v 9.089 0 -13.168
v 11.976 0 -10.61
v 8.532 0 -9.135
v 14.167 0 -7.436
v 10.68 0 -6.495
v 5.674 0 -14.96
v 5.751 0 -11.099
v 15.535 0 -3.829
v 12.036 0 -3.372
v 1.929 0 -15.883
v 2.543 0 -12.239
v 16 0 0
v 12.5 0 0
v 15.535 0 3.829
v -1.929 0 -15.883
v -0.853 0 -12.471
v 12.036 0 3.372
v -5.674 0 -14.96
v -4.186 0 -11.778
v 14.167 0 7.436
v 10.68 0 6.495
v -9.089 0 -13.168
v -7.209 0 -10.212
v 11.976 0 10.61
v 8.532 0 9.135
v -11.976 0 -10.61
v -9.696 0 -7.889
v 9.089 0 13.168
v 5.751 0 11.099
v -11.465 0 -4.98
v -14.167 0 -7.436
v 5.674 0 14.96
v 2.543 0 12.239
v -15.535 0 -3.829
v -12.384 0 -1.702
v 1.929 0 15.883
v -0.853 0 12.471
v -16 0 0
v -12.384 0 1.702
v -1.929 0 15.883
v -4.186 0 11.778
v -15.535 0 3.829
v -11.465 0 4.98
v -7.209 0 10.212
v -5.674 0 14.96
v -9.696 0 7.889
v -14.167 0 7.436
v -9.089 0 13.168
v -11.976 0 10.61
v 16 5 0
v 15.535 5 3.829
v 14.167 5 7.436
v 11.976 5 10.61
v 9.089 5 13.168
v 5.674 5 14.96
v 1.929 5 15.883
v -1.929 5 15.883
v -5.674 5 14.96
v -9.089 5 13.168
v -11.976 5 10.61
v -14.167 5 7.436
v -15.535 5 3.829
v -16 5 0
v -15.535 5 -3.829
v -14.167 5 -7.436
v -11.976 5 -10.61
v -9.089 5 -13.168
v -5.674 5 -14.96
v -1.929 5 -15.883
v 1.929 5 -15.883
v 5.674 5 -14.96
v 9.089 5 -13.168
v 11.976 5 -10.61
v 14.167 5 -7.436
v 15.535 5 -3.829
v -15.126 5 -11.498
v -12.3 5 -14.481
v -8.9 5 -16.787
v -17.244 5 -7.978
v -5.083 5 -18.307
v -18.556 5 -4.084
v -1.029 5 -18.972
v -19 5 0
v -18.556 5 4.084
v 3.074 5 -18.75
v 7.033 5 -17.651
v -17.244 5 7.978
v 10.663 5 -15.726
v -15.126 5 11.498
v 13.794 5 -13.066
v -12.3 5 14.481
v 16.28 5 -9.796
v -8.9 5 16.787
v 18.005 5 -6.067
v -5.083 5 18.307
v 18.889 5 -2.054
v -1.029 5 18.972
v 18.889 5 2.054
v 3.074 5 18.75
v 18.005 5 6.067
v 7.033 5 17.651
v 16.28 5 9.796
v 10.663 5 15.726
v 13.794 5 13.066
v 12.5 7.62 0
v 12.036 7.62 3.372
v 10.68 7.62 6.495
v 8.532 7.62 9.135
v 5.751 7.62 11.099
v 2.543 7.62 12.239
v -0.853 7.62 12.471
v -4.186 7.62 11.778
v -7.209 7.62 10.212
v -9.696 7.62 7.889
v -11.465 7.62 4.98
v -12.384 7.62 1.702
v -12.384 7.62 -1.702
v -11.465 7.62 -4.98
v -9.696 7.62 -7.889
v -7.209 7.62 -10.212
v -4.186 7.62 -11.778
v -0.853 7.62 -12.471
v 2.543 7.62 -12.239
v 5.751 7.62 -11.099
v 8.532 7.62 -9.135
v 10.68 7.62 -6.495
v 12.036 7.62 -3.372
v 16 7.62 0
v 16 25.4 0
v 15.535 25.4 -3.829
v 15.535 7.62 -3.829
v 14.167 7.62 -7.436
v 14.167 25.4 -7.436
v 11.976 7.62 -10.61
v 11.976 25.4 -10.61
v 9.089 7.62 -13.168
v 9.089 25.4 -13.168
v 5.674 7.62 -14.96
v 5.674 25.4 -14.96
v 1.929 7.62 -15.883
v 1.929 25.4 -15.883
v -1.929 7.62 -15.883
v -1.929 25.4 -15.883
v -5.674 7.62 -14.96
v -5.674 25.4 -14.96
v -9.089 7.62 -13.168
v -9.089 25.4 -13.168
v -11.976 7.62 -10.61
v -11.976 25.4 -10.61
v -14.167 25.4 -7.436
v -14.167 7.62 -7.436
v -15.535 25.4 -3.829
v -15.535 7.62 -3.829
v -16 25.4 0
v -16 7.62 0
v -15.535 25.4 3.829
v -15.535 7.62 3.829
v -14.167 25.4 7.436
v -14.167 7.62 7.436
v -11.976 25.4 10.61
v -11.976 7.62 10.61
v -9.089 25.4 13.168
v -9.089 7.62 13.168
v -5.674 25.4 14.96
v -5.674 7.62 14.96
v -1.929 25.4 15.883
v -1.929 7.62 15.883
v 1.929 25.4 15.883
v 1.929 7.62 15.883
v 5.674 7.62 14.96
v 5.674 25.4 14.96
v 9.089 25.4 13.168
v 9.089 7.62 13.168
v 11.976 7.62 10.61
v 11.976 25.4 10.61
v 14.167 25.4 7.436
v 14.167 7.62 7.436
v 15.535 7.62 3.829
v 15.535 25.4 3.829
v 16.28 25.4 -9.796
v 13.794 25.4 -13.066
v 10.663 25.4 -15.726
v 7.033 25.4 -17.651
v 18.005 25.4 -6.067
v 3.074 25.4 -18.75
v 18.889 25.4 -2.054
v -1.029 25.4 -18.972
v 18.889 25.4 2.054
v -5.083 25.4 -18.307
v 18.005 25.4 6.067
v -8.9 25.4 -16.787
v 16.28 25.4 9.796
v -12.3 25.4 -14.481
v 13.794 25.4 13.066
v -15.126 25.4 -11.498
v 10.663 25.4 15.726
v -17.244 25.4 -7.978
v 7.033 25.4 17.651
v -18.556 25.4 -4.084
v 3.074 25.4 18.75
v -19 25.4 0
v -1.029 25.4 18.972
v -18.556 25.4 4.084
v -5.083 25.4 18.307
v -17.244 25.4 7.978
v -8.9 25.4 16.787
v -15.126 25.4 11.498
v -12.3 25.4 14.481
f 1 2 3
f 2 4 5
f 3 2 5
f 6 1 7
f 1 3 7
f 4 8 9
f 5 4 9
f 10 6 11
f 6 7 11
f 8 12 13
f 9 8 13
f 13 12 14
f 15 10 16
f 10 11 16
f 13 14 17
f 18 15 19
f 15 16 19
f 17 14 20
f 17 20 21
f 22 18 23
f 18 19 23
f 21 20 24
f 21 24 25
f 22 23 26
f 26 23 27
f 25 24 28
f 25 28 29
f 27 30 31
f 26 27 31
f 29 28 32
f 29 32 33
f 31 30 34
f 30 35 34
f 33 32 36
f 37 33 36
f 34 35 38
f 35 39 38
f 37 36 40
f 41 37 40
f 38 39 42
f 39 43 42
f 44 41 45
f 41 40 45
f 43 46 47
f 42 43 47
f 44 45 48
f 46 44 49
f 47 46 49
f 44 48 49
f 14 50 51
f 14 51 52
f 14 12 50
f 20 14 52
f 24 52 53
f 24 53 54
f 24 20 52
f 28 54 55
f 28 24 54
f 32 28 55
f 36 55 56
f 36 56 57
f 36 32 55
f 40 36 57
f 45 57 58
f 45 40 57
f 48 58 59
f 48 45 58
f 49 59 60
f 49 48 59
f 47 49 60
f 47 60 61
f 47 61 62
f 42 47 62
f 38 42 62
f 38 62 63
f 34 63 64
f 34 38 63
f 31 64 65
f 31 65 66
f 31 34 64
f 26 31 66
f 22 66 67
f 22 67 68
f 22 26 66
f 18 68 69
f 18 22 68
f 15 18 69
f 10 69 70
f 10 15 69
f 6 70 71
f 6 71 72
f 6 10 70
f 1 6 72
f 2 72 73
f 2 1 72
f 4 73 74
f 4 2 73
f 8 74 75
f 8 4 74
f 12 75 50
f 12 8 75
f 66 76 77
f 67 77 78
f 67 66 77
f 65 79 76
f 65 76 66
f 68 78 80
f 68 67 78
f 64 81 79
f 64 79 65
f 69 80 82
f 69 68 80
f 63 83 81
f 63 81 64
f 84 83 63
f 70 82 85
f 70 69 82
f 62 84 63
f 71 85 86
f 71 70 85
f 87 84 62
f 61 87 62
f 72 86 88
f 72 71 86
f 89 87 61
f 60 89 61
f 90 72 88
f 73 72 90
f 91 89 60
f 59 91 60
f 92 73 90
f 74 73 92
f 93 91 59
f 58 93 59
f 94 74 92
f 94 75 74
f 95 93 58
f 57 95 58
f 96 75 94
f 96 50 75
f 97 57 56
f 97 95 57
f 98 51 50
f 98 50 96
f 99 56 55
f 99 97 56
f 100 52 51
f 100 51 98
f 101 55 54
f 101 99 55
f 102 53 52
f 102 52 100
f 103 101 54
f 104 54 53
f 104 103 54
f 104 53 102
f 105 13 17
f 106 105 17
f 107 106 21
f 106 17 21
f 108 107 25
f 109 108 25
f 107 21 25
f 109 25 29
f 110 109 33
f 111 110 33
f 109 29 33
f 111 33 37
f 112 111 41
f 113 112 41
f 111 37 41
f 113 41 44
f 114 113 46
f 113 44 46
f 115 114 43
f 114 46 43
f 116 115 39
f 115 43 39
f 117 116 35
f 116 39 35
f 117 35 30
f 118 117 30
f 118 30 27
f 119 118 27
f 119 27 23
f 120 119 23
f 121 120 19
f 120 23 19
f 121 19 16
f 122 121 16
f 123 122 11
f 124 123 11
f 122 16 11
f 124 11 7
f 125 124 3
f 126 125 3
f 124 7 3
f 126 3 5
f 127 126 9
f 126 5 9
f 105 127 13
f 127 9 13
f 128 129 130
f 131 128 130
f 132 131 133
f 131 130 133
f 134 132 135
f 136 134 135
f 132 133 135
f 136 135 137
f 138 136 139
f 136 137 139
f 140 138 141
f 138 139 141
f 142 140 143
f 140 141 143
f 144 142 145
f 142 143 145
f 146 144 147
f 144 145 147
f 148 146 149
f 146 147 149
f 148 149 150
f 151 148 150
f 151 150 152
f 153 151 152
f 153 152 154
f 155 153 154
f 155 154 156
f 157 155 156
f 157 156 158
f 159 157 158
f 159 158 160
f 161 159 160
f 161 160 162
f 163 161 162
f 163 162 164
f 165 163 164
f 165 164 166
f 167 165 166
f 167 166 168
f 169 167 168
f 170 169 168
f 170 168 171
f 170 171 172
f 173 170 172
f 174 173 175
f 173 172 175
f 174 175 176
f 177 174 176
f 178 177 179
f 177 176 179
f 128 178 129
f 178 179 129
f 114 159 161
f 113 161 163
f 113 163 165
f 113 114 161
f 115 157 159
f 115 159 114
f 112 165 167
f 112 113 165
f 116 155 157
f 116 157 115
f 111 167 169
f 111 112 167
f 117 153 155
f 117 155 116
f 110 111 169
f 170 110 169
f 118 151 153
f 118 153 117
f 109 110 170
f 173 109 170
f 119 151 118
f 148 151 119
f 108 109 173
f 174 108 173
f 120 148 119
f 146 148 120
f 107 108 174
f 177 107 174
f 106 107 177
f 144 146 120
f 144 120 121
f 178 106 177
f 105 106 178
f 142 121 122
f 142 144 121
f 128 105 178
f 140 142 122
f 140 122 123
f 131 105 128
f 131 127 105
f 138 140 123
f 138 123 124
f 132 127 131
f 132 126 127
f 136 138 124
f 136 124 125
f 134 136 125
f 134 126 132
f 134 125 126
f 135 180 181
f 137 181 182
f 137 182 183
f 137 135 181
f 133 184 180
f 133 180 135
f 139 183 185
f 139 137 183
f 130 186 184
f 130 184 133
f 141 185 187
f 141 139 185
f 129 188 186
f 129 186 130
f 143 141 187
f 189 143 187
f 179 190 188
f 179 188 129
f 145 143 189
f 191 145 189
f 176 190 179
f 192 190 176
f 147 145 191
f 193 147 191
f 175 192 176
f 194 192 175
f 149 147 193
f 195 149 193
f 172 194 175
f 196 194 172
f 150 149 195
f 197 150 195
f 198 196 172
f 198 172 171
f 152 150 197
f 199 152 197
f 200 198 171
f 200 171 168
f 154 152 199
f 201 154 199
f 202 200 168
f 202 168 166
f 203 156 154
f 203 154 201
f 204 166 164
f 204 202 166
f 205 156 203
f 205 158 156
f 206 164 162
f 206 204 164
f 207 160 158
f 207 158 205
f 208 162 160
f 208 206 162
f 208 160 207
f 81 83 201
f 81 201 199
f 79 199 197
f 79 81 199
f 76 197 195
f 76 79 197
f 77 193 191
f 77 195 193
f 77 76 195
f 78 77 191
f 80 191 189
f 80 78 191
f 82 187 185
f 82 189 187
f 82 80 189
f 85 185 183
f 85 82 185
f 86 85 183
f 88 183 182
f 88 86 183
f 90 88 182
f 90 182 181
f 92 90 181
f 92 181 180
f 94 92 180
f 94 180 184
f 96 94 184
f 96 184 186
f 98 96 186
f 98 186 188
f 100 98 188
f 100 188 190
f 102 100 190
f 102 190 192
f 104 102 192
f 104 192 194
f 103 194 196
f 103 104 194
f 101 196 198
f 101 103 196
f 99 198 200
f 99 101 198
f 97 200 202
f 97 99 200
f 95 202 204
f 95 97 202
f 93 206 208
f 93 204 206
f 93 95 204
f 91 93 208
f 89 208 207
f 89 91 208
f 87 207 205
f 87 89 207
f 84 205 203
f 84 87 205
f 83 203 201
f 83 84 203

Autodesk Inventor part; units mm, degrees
ref_plane "YZ Plane" through (0, 0, 0) normal (1, 0, 0) x (0, 1, 0)
ref_plane "XZ Plane" through (0, 0, 0) normal (0, 1, 0) x (-1, 0, 0)
ref_plane "XY Plane" through (0, 0, 0) normal (0, 0, 1) x (1, 0, 0)
sketch "Sketch1" plane through (0, 0, 0) normal (0, 1, 0) x (-1, 0, 0)
  circle A0 centre (0, 0) radius 19
  dimension "d0" = 38
extrude "Extrusion1" add sketch "Sketch1" along normal blind 25.4
sketch "Sketch3" plane through (0, 0, 0) normal (0, -1, 0) x (1, 0, 0)
  circle A0 centre (0, 0) radius 19 projected
  circle A1 centre (0, 0) radius 16
  dimension "d9" = 32
extrude "Extrusion3" cut sketch "Sketch3" against normal blind 5
thread "Thread2" size "M32x1.5" class "6g" standard "ANSI Metric M Profile" length 25.4
sketch "Sketch4" plane through (0, 25.4, 0) normal (0, 1, 0) x (1, 0, 0)
  circle A0 centre (0, 0) radius 16
  dimension "d14" = 32
extrude "Extrusion4" cut sketch "Sketch4" against normal blind 17.78
thread "Thread3" size "M32x1.5" class "6H" standard "ANSI Metric M Profile" length 5
sketch "Sketch5" plane through (0, 0, 0) normal (0, -1, 0) x (1, 0, 0)
  circle A0 centre (0, 0) radius 12.5
  dimension "d19" = 25
extrude "Extrusion5" cut sketch "Sketch5" against normal blind 17.78
properties part number "NA1-1PiezoExtension"
